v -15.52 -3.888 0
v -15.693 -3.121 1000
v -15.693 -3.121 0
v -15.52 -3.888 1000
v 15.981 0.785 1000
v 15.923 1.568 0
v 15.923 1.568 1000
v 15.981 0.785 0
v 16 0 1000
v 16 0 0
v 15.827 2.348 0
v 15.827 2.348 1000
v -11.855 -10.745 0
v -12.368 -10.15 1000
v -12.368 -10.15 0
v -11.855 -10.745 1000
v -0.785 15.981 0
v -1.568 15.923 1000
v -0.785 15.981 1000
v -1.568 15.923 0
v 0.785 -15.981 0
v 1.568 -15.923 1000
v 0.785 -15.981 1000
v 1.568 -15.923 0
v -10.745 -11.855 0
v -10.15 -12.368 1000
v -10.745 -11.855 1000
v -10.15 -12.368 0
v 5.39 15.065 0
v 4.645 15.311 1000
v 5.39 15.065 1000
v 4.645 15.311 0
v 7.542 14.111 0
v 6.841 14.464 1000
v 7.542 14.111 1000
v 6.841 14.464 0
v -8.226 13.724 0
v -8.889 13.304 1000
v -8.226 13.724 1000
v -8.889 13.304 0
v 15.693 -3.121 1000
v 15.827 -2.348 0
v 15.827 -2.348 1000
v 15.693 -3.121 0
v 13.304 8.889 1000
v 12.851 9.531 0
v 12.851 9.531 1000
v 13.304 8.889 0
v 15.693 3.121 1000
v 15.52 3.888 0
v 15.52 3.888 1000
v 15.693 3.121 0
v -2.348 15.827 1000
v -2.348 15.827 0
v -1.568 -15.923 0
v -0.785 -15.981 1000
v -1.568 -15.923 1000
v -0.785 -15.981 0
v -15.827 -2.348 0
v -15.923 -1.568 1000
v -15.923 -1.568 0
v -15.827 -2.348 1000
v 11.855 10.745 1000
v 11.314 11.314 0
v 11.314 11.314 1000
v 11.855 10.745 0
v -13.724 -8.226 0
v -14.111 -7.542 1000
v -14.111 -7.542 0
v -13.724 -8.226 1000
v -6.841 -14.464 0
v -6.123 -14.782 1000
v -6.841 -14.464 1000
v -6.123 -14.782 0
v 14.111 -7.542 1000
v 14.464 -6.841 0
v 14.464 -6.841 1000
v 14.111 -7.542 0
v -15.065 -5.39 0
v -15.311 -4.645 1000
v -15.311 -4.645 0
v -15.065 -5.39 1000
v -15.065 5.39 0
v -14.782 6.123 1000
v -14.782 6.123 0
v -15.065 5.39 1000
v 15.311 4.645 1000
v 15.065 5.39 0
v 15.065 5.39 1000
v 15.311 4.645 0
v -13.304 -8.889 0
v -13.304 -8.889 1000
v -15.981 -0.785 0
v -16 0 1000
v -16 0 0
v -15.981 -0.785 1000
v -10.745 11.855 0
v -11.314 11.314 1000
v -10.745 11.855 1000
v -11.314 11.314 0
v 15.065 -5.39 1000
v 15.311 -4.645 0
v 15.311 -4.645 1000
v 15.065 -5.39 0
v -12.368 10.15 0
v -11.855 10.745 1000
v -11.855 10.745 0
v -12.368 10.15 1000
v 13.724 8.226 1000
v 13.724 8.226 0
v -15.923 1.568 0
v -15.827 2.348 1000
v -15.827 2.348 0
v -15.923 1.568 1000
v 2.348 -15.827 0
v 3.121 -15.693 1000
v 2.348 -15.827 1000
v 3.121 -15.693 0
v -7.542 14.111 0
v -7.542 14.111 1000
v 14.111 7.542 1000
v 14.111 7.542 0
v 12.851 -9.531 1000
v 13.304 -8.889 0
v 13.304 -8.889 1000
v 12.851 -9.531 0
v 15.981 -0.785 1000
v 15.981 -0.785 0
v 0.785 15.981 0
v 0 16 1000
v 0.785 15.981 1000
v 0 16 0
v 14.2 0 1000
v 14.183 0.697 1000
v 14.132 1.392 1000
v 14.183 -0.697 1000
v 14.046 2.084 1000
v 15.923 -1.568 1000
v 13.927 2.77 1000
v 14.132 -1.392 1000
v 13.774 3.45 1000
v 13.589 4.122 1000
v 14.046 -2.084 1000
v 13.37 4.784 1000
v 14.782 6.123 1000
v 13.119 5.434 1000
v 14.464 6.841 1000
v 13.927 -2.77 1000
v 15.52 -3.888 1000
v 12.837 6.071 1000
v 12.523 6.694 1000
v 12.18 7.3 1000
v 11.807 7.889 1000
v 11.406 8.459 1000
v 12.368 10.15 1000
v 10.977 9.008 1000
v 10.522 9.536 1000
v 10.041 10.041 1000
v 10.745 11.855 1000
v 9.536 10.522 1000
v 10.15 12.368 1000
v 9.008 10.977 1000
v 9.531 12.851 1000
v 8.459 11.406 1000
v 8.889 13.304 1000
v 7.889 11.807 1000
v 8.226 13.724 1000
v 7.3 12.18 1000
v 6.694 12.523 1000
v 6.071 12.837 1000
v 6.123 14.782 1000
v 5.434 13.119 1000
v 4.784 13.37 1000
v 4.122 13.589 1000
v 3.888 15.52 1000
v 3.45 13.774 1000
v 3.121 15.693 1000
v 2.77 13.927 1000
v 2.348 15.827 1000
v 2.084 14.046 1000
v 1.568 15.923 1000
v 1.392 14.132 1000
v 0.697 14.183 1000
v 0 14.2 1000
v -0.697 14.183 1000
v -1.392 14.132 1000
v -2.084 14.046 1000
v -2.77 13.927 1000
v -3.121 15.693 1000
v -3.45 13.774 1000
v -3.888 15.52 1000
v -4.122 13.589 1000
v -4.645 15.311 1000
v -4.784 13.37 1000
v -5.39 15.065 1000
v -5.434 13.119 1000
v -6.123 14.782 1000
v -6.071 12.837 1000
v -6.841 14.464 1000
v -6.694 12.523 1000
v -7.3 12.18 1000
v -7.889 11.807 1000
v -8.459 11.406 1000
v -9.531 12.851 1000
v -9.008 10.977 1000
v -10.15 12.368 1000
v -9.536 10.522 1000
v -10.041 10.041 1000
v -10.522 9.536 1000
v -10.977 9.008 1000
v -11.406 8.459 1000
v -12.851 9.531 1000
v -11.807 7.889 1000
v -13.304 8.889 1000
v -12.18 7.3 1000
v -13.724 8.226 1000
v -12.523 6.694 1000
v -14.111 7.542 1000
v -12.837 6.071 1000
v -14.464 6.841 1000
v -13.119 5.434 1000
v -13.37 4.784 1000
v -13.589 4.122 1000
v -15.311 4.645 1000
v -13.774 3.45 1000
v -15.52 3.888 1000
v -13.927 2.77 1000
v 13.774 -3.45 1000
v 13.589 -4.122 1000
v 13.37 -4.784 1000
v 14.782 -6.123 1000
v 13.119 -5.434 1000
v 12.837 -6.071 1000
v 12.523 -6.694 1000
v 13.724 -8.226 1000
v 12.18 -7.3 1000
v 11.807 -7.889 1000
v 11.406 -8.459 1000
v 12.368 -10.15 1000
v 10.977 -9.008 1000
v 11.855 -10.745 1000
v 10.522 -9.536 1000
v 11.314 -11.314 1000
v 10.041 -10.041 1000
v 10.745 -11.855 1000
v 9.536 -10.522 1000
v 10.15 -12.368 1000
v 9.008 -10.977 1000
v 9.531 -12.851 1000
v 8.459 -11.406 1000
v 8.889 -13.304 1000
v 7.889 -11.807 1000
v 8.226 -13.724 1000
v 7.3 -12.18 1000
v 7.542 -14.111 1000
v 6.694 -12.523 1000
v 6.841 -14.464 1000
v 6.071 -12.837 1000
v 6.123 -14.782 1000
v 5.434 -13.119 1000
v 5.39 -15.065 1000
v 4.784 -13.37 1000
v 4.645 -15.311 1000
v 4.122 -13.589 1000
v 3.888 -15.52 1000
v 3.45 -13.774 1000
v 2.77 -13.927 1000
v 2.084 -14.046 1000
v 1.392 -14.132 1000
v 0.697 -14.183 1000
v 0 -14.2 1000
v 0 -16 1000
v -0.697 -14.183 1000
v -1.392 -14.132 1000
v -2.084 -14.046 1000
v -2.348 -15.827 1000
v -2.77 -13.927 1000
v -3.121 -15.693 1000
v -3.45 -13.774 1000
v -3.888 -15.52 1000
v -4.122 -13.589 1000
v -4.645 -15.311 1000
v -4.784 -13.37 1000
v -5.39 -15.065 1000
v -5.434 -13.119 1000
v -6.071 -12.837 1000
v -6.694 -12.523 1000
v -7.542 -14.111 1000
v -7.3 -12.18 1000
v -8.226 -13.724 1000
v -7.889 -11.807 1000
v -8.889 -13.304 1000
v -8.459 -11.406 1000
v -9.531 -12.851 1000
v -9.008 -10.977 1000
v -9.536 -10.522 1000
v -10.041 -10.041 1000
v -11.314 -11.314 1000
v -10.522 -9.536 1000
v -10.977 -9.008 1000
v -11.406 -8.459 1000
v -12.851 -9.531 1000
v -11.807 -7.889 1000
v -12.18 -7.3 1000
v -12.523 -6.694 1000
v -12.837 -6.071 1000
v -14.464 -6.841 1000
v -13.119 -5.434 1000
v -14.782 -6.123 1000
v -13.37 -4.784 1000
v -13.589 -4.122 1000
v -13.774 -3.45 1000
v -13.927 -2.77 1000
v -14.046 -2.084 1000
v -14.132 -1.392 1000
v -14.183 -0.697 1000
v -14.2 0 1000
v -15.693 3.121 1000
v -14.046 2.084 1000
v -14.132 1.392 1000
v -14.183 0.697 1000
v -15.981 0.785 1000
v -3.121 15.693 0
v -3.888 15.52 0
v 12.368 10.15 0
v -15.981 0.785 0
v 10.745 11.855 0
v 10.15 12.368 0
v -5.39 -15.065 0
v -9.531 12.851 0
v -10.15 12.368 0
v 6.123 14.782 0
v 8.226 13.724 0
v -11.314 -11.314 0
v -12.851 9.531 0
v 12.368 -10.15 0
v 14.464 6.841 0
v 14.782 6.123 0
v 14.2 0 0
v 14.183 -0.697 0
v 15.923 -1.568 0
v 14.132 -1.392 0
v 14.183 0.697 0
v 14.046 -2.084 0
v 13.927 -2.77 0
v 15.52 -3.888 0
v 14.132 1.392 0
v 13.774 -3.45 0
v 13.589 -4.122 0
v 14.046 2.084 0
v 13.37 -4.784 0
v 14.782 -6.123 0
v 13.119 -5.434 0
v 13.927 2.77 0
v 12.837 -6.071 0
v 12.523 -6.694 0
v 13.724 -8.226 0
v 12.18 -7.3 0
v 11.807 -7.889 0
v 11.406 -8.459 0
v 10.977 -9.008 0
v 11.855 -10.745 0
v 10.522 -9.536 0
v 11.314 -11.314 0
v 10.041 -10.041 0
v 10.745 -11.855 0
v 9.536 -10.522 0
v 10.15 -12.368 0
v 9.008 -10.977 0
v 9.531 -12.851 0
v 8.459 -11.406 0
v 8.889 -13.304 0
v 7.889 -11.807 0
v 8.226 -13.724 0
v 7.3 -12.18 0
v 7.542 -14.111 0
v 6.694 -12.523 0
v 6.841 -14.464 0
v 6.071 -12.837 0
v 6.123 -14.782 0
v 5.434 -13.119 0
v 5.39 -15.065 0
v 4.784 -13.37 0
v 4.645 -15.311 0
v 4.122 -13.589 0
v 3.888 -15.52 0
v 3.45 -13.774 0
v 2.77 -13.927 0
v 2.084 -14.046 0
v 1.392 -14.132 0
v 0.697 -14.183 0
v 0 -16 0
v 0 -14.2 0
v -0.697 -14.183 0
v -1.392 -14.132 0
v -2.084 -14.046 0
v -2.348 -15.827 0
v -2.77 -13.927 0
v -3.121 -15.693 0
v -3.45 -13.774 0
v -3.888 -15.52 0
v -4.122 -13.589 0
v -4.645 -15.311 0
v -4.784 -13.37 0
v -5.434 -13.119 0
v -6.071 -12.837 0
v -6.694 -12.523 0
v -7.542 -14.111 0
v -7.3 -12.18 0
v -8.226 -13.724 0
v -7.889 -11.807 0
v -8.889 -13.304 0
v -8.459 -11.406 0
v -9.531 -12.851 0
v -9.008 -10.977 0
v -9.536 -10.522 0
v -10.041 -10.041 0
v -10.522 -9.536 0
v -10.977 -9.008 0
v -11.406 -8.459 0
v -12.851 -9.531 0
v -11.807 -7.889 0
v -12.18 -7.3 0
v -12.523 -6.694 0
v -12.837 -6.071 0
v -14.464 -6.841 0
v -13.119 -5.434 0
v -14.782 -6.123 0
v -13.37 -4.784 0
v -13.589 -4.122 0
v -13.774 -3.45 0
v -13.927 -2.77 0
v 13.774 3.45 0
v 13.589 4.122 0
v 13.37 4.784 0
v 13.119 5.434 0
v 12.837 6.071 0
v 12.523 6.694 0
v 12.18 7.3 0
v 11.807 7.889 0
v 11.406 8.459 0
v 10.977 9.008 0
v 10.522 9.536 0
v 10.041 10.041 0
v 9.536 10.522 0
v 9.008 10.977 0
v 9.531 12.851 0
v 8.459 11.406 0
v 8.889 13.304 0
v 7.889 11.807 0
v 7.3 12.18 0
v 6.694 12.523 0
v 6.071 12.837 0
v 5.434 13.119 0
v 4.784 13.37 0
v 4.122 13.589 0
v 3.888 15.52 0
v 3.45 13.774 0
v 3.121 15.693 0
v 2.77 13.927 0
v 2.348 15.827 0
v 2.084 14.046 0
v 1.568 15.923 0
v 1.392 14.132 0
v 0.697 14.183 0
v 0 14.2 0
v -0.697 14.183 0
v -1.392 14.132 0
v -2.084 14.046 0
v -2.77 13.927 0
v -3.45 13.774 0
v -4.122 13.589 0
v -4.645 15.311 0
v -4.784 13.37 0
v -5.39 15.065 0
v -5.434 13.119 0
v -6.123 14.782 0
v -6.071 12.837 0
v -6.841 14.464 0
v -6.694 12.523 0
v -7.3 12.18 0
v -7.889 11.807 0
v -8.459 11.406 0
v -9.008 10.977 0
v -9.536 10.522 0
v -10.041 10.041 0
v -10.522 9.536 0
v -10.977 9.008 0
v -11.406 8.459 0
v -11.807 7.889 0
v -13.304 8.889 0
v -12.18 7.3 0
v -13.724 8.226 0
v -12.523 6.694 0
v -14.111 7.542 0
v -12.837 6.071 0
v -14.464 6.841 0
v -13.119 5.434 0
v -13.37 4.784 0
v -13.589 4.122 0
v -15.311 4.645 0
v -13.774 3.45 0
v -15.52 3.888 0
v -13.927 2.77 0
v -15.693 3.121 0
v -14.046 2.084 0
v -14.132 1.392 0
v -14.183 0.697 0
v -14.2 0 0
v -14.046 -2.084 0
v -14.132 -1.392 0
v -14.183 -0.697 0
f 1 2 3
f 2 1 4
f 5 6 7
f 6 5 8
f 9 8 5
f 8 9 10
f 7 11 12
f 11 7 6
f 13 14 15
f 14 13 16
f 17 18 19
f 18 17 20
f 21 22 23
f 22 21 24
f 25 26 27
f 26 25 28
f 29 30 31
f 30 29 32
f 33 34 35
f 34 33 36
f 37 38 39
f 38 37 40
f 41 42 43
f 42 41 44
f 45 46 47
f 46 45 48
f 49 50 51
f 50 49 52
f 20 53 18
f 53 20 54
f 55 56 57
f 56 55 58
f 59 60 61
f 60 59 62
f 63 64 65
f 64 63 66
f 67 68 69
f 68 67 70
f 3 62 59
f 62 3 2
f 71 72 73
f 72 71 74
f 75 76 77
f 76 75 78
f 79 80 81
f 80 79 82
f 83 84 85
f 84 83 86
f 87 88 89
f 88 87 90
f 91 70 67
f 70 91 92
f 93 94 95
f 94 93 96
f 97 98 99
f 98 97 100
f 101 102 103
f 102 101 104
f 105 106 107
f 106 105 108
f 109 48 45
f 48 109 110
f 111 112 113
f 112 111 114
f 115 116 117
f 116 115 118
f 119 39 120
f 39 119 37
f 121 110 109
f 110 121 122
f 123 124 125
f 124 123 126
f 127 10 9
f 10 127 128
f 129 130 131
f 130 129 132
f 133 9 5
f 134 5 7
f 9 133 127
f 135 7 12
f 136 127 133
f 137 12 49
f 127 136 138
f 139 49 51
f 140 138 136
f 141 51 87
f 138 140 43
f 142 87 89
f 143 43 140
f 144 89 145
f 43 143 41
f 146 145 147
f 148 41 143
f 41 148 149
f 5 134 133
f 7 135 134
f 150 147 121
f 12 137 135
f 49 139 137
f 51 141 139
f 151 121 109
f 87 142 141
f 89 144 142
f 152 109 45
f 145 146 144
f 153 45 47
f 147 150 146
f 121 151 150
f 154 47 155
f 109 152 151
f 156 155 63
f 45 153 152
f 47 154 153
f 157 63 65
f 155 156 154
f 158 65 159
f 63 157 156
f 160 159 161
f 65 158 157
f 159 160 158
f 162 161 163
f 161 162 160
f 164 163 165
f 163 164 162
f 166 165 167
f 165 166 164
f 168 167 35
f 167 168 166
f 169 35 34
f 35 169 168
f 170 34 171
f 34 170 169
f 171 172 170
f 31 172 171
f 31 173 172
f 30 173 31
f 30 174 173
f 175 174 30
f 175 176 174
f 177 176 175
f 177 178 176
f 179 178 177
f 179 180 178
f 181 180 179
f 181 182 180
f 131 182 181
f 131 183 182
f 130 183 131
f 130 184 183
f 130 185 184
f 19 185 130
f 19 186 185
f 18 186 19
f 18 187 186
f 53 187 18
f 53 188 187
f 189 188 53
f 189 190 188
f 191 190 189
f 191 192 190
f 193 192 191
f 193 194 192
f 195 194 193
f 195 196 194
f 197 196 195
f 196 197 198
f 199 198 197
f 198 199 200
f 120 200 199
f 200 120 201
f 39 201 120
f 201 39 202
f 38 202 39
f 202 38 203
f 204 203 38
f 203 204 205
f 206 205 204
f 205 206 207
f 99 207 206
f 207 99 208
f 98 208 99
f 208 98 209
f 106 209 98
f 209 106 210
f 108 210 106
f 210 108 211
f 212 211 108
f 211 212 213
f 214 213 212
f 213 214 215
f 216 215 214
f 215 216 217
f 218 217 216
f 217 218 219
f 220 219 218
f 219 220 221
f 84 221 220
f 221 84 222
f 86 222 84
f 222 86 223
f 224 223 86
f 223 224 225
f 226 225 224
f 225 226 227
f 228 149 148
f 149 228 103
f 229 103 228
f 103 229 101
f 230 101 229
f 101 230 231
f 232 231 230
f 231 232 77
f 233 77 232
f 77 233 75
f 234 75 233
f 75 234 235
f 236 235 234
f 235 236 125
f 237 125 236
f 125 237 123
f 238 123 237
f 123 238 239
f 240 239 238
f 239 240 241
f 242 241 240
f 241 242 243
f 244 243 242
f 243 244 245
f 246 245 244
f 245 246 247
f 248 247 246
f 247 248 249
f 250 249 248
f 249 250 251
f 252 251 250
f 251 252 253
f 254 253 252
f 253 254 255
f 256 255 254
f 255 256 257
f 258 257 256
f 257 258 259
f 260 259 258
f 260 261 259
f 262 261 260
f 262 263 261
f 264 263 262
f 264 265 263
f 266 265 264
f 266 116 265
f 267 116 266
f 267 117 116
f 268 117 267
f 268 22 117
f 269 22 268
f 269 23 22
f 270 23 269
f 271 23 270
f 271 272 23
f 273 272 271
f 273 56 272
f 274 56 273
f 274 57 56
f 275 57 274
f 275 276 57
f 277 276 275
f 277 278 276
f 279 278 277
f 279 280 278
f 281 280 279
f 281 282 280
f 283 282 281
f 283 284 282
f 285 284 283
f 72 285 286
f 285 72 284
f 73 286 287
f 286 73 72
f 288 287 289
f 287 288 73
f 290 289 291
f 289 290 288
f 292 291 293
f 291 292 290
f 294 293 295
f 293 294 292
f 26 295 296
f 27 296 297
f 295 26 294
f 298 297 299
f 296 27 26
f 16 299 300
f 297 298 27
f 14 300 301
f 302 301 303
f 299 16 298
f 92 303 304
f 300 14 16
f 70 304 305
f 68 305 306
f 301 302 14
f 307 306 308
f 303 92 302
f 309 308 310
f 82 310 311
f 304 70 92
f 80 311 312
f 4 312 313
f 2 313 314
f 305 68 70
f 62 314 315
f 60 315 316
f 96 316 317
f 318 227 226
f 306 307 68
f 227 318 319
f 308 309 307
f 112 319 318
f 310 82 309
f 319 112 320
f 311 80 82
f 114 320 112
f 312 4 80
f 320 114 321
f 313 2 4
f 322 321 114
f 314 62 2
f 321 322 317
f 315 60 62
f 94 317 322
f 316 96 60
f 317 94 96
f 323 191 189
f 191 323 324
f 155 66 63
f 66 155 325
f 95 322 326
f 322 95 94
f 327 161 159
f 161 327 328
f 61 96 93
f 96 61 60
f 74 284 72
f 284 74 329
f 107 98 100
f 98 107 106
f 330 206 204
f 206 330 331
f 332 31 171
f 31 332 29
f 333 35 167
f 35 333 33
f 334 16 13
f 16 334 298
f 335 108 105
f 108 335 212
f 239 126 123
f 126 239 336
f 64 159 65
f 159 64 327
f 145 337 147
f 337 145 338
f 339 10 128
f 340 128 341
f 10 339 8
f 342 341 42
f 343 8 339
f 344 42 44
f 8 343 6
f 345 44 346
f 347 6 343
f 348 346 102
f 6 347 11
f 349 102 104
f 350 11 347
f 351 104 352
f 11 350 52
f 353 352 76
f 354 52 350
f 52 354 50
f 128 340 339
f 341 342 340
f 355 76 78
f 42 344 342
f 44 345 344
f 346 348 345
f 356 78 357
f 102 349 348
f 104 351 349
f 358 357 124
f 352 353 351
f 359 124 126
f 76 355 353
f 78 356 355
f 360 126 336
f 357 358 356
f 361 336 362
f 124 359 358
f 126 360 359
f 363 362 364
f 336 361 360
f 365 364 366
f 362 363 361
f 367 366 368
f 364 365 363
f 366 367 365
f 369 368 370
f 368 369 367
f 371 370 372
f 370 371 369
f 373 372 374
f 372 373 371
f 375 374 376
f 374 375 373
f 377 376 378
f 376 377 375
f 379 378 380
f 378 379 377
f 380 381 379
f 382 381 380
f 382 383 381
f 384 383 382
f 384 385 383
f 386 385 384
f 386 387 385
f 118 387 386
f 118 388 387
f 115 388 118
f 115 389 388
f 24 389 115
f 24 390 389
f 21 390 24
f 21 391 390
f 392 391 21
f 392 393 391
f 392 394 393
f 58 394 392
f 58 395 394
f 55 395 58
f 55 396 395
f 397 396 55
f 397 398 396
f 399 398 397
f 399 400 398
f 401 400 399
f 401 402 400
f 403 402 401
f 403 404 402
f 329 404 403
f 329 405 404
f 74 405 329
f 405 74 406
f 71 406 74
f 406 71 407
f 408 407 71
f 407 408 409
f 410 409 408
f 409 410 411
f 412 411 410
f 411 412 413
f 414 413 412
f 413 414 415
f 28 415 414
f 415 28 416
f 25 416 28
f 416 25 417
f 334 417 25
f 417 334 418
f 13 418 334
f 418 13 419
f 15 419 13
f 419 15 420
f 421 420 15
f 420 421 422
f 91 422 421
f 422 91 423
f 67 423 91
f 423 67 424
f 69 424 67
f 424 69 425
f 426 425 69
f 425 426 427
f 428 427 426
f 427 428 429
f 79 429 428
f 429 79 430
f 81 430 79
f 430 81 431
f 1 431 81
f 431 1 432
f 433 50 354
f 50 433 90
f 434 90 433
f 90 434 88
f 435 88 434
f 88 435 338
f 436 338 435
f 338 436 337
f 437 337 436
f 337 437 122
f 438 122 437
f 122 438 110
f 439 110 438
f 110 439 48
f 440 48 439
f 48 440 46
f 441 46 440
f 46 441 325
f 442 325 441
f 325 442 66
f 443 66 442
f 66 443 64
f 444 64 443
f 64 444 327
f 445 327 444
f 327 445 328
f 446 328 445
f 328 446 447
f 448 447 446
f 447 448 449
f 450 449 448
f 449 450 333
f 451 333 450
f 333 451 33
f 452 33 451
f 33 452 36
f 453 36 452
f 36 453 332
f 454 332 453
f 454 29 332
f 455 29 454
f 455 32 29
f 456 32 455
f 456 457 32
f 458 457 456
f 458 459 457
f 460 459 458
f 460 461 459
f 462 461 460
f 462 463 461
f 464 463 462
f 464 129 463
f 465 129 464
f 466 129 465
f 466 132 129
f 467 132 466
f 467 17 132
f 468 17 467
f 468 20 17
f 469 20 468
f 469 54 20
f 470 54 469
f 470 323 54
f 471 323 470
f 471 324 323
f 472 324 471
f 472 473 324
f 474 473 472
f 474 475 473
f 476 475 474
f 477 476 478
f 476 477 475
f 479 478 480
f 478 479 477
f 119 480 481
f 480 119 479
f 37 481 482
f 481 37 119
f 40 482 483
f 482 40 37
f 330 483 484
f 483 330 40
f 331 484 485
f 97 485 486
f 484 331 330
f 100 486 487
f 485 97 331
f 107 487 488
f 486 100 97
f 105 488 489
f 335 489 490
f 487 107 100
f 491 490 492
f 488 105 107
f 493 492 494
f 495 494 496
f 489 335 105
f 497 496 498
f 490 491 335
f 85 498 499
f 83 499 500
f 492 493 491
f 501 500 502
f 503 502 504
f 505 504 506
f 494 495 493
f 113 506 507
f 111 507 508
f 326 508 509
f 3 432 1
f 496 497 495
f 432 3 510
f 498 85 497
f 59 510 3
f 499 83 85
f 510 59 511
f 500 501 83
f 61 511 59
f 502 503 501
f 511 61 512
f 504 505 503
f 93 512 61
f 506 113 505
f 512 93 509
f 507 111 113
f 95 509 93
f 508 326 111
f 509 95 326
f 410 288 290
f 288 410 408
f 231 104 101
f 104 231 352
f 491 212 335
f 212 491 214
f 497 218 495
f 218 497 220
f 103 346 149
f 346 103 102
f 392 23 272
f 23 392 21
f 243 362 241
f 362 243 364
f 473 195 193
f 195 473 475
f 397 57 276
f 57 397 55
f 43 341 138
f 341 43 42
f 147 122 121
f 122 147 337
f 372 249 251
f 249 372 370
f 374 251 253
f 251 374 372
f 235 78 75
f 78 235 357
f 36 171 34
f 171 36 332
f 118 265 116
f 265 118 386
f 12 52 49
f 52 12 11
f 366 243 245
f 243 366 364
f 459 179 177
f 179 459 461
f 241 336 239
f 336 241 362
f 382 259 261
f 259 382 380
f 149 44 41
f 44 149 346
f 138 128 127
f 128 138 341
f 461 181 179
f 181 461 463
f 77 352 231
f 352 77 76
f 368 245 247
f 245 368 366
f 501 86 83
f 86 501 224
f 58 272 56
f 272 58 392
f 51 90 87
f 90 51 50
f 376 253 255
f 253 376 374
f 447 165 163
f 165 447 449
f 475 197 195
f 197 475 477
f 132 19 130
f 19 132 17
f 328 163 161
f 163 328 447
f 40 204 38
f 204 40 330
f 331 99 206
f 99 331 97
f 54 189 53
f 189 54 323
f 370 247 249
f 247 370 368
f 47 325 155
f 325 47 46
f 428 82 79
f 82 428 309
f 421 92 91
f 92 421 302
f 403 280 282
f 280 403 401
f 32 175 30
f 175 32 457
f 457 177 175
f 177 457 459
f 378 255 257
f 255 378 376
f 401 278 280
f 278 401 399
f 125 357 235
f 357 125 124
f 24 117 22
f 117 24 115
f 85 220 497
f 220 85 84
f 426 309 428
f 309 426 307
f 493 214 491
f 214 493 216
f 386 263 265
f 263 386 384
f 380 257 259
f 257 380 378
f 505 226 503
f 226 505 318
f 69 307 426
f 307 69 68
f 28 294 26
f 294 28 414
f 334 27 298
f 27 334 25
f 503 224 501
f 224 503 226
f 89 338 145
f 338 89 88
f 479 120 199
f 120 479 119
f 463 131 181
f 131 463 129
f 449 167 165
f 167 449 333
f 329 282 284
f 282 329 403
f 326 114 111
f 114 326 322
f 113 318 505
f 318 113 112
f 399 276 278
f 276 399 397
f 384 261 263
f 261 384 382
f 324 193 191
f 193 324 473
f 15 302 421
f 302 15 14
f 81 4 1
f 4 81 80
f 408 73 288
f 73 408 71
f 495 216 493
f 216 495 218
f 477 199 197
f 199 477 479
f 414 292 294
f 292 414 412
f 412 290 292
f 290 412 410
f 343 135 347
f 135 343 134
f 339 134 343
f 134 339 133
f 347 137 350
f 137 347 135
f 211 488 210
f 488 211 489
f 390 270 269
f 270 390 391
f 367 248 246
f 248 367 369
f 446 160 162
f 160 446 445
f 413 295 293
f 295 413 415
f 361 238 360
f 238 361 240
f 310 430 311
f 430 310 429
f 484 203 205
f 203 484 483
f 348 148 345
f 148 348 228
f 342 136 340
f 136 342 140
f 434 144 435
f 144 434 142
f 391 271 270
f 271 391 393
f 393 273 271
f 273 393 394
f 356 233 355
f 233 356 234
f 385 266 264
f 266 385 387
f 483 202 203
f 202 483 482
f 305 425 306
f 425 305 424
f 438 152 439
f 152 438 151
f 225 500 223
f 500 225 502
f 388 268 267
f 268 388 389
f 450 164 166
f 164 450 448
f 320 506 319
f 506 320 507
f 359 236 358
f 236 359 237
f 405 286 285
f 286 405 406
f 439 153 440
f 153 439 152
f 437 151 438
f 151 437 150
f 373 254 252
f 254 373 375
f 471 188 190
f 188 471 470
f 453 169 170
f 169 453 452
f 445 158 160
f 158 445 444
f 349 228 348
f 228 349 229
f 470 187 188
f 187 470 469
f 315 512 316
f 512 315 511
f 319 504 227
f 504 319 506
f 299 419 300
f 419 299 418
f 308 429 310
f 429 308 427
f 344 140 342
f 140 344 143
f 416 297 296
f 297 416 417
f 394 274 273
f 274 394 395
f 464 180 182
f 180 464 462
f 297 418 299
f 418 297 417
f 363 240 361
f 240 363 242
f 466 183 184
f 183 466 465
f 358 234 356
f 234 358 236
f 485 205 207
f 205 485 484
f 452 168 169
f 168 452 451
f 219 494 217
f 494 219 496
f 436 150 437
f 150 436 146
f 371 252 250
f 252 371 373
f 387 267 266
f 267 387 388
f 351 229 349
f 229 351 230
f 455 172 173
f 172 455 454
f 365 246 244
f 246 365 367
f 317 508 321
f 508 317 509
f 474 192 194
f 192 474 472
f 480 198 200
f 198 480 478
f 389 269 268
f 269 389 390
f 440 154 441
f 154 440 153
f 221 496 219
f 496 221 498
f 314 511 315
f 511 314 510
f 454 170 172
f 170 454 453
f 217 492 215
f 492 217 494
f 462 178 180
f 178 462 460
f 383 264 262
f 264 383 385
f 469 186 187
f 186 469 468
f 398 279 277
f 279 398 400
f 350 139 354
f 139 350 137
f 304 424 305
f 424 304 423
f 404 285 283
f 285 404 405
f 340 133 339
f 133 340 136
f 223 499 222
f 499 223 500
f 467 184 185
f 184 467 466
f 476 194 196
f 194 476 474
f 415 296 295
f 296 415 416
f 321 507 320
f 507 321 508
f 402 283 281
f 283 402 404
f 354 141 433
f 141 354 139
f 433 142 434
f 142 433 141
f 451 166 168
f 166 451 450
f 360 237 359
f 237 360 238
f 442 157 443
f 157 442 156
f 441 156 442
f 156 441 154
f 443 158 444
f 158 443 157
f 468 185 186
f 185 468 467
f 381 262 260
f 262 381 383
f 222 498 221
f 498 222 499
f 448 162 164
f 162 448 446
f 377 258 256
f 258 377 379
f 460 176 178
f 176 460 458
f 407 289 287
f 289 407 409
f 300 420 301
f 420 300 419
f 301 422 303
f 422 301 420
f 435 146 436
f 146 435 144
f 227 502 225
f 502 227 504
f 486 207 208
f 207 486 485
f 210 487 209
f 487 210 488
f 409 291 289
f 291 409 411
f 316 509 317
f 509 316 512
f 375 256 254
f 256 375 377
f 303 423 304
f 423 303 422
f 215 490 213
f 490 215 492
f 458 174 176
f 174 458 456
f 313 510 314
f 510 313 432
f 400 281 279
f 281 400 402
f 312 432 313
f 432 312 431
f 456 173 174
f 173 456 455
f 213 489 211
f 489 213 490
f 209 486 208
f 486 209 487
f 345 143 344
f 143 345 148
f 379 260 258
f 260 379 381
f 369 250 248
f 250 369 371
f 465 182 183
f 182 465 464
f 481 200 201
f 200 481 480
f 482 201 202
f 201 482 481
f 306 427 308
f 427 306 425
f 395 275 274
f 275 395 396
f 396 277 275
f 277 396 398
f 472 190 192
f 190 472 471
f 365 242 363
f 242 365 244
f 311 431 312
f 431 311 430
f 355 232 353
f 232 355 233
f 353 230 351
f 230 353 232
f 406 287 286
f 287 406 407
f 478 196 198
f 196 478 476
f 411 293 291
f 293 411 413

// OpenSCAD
$fn = 128;

// HT pipe parameters (approximate for HT 32)
length = 1000;          // mm
outer_d = 32;           // mm
wall = 1.8;             // mm (typical-ish for HT 32; adjust if needed)
inner_d = outer_d - 2*wall;

module ht_pipe(len=1000, od=32, id=28.4) {
    difference() {
        cylinder(h=len, d=od);
        translate([0,0,-0.5])
            cylinder(h=len+1, d=id);
    }
}

ht_pipe(length, outer_d, inner_d);
